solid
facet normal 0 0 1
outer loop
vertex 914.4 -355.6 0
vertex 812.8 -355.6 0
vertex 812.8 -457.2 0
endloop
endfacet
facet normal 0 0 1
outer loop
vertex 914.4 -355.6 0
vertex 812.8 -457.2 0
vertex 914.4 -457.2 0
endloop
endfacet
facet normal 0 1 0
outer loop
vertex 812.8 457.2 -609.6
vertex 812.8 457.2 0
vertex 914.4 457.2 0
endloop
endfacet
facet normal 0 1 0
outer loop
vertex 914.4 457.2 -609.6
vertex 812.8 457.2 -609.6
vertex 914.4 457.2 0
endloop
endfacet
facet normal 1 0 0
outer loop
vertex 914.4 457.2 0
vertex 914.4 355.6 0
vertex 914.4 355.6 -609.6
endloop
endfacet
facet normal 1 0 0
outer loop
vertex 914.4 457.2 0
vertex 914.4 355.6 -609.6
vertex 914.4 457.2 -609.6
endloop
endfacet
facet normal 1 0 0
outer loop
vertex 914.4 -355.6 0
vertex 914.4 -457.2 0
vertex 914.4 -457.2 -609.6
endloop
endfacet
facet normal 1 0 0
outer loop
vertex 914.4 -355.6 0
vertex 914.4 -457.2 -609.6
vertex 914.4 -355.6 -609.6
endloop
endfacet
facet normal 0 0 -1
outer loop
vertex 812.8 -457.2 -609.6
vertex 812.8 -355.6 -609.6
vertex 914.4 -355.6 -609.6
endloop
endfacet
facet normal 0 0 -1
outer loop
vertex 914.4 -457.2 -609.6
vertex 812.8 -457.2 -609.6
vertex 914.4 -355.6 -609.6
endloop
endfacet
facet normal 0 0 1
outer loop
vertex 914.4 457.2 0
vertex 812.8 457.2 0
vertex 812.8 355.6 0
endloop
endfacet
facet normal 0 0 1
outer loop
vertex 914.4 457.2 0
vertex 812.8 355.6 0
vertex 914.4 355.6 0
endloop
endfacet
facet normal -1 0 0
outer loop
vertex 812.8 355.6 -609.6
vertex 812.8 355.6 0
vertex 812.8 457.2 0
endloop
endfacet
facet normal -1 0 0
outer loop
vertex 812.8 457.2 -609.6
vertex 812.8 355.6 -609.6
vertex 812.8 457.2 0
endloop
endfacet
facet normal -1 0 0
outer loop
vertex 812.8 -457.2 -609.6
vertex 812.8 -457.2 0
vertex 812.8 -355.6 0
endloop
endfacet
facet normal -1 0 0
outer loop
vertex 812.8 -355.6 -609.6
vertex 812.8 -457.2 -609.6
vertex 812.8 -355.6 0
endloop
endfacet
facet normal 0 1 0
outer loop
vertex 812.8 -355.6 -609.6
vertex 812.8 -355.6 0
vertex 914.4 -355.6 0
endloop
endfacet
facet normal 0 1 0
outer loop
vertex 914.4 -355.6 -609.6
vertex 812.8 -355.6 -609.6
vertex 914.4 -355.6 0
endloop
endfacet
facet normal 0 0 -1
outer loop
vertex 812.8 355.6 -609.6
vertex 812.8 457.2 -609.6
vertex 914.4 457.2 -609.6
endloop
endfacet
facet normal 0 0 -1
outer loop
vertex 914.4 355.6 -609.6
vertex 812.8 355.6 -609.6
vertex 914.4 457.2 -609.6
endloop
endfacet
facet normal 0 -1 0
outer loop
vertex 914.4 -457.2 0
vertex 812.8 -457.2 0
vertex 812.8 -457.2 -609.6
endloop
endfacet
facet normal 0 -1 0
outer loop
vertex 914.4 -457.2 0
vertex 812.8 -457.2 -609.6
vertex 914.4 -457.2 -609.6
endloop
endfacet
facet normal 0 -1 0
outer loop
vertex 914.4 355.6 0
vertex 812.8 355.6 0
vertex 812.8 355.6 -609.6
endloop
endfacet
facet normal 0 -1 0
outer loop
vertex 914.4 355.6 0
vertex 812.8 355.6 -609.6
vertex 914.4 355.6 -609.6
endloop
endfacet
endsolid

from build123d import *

# Parameters (mm, degrees)
F1_W     = 101.6
F1_H     = 101.6
F2_DEPTH = 609.6


with BuildPart() as f2:
    # F1 (on Top) → F2 (new body)
    with BuildSketch(Plane.XY):
        with Locations((863.6, -406.4)):
            Rectangle(F1_W, F1_H)
        with Locations((863.6, 406.4)):
            Rectangle(F1_W, F1_H)
    extrude(amount=-F2_DEPTH)


solid = f2.part
